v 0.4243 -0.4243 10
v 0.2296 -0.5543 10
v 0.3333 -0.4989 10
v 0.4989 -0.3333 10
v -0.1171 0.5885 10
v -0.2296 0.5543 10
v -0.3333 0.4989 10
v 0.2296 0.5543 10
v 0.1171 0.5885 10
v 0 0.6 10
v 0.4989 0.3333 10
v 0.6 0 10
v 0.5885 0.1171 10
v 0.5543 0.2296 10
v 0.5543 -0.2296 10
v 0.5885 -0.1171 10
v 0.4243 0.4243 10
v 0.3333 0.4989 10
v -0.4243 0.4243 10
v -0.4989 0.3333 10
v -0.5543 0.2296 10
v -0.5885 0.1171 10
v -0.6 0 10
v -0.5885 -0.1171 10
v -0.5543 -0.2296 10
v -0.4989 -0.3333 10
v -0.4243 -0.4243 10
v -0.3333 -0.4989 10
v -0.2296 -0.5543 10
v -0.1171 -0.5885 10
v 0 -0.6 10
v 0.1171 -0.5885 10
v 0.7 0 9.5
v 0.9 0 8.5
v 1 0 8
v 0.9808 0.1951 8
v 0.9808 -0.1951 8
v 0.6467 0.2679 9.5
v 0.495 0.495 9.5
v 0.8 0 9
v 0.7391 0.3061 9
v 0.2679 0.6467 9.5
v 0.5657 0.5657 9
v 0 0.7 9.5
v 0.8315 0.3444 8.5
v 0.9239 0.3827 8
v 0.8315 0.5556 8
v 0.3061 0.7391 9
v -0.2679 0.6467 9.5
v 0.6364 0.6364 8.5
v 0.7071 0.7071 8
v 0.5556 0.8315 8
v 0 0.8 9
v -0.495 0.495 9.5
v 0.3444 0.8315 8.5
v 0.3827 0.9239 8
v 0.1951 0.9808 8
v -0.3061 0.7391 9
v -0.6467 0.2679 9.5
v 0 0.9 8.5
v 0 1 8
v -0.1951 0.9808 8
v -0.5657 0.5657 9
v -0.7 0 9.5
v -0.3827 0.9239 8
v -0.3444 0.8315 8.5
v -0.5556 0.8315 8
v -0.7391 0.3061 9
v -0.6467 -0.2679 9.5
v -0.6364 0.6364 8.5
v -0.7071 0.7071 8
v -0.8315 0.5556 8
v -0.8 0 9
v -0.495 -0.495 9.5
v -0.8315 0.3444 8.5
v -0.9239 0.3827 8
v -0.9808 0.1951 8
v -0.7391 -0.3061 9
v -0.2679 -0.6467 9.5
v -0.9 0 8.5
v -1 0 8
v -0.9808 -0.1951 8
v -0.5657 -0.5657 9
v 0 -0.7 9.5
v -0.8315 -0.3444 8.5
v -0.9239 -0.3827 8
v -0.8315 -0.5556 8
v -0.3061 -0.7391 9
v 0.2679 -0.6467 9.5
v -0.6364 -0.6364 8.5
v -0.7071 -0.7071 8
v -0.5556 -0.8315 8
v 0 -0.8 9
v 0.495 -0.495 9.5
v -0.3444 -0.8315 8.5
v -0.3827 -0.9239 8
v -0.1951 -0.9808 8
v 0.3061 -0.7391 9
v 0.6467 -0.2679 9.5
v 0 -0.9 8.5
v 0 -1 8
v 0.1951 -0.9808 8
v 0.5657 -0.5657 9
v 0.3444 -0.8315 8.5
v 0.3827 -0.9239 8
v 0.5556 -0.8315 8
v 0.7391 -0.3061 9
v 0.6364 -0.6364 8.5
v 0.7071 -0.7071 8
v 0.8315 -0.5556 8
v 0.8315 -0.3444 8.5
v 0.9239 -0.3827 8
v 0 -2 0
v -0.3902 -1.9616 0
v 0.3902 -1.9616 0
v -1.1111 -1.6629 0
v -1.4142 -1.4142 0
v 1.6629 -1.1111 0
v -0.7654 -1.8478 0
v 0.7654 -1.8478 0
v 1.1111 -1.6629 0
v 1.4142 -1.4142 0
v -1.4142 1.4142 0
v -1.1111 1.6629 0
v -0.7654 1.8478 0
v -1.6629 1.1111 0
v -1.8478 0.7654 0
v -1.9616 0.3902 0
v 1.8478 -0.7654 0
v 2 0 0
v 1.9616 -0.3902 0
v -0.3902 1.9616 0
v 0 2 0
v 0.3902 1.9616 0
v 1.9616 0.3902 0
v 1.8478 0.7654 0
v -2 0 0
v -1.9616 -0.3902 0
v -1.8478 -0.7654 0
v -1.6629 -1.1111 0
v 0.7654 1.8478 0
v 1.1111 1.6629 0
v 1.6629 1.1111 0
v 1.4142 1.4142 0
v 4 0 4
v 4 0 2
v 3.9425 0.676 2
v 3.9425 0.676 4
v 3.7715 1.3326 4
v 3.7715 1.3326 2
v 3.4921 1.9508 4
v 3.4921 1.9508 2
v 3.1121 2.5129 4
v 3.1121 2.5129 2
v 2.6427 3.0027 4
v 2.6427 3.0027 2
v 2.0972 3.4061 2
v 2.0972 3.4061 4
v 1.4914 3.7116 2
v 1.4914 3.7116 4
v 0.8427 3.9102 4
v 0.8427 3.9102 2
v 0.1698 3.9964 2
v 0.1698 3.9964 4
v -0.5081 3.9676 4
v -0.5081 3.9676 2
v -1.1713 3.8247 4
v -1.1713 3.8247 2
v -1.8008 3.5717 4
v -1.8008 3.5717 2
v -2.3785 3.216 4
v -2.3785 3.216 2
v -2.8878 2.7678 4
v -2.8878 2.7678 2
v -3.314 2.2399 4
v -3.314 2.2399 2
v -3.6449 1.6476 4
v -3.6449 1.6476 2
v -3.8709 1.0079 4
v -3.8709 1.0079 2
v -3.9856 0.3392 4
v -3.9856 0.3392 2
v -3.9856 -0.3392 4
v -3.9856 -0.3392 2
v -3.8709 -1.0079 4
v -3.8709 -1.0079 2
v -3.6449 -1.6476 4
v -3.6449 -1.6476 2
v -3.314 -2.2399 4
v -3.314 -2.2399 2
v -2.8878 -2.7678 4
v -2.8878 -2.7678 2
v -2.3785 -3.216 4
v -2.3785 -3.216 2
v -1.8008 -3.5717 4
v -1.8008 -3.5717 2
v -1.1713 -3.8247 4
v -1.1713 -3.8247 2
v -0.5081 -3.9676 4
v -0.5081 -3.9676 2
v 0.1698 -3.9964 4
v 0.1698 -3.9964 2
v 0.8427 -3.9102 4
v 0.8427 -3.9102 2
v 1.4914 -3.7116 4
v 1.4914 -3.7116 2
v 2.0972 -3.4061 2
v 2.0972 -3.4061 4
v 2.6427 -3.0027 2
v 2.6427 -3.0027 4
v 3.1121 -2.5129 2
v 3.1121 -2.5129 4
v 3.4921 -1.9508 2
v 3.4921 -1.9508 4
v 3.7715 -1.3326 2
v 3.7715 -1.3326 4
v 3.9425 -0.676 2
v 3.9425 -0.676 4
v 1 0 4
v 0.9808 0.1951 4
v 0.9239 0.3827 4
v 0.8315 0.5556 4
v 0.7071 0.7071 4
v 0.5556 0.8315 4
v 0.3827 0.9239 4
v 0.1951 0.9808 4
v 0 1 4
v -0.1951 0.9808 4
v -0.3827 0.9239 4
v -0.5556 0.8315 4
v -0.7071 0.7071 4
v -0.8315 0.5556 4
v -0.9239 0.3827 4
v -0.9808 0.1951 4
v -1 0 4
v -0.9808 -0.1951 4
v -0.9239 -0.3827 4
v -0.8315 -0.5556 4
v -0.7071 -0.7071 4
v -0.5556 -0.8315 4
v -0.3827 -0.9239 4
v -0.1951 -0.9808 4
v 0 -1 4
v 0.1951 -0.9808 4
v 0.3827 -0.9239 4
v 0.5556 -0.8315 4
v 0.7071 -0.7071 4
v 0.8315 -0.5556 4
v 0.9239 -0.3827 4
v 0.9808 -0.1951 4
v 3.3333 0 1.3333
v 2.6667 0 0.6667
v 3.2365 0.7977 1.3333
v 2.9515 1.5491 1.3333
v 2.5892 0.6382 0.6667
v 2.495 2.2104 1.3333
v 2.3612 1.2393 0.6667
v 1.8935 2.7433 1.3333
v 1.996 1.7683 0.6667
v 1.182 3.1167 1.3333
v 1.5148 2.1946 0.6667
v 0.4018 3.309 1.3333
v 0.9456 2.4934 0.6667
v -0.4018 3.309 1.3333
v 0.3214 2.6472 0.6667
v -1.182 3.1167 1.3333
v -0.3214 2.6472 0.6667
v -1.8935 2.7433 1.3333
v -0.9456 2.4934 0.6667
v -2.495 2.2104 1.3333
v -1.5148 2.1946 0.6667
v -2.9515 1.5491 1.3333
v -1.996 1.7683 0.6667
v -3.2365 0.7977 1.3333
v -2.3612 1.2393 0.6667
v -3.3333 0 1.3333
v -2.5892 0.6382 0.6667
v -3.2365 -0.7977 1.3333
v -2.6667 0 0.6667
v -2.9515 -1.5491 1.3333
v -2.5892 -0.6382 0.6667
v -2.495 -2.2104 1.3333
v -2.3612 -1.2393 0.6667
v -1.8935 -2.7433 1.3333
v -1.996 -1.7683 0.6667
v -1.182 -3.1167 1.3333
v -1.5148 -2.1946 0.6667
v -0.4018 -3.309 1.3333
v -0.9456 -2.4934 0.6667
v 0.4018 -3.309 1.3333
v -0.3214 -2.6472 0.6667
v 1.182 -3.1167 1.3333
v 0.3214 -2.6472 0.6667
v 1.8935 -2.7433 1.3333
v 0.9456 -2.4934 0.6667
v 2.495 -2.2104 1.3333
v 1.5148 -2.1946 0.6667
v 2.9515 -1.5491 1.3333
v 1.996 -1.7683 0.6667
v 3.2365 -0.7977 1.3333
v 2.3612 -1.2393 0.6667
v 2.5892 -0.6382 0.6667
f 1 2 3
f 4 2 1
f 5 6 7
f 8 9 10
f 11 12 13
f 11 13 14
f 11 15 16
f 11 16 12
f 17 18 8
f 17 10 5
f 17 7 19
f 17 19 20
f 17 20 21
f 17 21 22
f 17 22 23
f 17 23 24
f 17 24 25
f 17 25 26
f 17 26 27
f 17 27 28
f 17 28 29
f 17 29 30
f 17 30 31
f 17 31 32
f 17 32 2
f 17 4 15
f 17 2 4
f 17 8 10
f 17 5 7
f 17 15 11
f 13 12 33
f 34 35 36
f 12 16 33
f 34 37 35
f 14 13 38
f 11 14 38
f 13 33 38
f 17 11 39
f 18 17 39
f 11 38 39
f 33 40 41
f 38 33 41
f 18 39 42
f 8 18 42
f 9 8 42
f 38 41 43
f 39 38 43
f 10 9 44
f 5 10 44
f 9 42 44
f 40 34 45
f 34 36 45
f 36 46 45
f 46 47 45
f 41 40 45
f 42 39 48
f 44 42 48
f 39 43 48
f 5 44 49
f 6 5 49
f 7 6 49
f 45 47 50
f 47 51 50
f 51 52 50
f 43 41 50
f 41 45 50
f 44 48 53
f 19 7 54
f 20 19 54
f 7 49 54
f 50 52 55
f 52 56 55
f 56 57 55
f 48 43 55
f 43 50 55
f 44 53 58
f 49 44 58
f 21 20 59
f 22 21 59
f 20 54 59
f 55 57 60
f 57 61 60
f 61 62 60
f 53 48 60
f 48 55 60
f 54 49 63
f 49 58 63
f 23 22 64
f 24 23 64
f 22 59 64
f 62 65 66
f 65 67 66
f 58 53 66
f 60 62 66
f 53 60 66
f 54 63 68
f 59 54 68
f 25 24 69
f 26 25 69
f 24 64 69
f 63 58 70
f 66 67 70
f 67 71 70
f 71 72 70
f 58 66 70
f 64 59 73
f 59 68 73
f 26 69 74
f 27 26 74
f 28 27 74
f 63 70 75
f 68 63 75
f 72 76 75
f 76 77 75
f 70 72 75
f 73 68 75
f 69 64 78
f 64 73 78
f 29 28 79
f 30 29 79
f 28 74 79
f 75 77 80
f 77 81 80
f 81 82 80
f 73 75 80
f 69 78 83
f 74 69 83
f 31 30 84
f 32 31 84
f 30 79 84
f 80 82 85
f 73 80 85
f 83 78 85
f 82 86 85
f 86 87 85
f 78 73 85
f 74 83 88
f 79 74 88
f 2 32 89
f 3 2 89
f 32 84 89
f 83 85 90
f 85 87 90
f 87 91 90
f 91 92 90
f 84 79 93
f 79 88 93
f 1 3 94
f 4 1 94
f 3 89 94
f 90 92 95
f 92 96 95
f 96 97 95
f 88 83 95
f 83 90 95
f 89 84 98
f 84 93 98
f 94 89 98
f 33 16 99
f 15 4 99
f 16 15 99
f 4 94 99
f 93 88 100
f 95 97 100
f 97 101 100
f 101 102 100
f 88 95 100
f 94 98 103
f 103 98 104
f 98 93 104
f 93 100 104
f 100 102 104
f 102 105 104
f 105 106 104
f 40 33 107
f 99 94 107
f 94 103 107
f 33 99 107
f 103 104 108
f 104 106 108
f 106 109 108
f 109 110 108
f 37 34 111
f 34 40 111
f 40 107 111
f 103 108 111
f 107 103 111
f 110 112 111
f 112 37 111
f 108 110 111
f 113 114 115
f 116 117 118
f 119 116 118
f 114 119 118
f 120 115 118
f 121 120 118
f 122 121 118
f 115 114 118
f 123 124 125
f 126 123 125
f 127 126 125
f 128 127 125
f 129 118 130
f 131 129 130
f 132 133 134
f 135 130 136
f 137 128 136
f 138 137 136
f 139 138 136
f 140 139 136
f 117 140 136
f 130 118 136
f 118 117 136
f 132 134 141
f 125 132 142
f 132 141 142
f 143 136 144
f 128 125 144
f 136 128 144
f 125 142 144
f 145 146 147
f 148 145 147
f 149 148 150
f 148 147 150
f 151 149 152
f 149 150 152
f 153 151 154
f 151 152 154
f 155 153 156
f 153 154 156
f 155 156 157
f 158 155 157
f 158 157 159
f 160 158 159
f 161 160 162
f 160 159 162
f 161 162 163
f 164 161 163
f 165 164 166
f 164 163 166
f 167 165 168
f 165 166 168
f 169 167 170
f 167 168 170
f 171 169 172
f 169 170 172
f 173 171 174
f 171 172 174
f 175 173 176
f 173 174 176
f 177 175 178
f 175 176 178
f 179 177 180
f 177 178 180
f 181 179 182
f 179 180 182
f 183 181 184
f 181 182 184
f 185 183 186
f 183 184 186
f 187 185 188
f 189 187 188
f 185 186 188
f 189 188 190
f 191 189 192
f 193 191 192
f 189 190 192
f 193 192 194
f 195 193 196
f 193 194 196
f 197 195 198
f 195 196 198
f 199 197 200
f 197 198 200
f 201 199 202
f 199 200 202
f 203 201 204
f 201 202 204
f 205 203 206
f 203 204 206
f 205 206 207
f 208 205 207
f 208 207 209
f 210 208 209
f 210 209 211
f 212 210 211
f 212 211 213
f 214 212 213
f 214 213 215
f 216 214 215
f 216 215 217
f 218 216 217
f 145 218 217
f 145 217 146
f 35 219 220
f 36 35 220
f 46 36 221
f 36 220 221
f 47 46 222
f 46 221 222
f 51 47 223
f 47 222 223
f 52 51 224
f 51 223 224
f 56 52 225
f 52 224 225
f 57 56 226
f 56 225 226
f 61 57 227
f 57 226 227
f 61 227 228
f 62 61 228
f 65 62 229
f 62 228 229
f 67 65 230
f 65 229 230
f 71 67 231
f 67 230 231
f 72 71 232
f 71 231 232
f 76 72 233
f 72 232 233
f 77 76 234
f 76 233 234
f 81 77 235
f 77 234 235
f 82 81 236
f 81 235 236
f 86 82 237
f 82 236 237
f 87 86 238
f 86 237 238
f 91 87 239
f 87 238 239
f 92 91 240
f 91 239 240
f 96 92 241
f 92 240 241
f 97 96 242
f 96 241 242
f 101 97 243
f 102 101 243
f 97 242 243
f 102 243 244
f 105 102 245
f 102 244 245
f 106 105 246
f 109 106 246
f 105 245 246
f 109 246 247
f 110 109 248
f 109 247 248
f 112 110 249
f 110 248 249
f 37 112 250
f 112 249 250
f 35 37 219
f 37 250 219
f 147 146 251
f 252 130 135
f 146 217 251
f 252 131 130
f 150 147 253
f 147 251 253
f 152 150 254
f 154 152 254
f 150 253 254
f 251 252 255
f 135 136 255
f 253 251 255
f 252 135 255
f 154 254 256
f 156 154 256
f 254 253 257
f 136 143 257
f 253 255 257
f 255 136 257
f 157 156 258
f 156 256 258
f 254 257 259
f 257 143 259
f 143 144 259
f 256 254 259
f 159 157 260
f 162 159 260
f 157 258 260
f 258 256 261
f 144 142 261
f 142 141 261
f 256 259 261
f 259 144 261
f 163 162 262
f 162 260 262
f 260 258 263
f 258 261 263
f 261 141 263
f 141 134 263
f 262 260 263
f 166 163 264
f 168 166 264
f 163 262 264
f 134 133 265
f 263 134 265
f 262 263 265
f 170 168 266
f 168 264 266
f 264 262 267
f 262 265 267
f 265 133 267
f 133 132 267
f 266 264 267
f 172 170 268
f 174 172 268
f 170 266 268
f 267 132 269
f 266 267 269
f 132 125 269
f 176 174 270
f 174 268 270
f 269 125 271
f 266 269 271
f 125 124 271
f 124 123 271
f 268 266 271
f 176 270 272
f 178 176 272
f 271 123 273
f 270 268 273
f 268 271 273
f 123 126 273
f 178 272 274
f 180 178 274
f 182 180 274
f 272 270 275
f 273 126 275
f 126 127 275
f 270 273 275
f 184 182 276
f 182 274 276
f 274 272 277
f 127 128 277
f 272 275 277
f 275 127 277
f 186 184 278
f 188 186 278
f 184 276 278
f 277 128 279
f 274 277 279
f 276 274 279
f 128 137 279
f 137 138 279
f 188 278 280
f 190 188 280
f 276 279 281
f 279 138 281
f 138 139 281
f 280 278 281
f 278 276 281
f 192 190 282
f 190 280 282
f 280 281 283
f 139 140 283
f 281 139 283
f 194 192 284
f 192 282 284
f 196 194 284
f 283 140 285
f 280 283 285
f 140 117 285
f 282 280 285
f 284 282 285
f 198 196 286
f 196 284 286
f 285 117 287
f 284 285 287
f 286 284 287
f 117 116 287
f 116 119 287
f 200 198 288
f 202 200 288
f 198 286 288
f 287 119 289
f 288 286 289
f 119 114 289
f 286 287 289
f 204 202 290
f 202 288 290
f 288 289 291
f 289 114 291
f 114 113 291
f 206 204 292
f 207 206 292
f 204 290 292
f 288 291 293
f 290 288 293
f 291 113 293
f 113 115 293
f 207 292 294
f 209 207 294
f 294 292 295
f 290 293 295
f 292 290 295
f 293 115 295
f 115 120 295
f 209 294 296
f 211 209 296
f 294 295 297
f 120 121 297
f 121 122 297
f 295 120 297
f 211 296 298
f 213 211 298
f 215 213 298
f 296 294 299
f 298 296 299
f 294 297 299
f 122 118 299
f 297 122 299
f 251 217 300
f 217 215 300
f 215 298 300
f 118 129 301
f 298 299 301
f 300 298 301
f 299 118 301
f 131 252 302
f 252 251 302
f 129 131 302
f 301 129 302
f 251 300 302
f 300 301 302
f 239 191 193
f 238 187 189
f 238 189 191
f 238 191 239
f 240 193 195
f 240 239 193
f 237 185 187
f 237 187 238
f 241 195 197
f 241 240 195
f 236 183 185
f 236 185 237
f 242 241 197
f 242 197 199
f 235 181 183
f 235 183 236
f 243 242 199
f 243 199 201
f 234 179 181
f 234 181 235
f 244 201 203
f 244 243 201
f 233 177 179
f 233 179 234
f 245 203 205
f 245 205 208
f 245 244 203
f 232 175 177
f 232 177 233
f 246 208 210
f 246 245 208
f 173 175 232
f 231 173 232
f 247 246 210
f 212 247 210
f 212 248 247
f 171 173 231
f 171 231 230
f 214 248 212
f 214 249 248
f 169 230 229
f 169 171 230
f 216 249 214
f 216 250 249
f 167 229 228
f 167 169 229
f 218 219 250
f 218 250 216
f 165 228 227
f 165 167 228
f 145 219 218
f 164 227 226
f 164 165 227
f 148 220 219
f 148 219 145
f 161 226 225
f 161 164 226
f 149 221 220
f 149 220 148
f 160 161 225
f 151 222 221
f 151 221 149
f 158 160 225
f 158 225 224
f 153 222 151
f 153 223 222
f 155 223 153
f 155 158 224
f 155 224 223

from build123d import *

# Parameters (mm, degrees)
F0_R     = 4
F1_DEPTH = 4
F2_R     = 1
F3_DEPTH = 6
F4_SIZE2 = 2
F4_SIZE  = 0.4
F5_SIZE2 = 2
F5_SIZE  = 2


with BuildPart() as f1:
    # F0 (on Top) → F1 (new body)
    with BuildSketch(Plane.XY):
        Circle(F0_R)
    extrude(amount=F1_DEPTH)

    # F2 (on face) → F3 (join)
    with BuildSketch(Plane.XY.offset(4)):
        Circle(F2_R)
    extrude(amount=F3_DEPTH)

    # F4
    f4_edges = [f1.edges().sort_by_distance(p)[0] for p in [
        (-1, 0, 10),
    ]]
    f4_side = f1.faces().sort_by_distance((0, 0, 10))[0]
    chamfer(f4_edges, length=F4_SIZE, length2=F4_SIZE2, reference=f4_side)

    # F5
    f5_edges = [f1.edges().sort_by_distance(p)[0] for p in [
        (-4, 0, 0),
    ]]
    chamfer(f5_edges, length=F5_SIZE, length2=F5_SIZE2)


solid = f1.part
